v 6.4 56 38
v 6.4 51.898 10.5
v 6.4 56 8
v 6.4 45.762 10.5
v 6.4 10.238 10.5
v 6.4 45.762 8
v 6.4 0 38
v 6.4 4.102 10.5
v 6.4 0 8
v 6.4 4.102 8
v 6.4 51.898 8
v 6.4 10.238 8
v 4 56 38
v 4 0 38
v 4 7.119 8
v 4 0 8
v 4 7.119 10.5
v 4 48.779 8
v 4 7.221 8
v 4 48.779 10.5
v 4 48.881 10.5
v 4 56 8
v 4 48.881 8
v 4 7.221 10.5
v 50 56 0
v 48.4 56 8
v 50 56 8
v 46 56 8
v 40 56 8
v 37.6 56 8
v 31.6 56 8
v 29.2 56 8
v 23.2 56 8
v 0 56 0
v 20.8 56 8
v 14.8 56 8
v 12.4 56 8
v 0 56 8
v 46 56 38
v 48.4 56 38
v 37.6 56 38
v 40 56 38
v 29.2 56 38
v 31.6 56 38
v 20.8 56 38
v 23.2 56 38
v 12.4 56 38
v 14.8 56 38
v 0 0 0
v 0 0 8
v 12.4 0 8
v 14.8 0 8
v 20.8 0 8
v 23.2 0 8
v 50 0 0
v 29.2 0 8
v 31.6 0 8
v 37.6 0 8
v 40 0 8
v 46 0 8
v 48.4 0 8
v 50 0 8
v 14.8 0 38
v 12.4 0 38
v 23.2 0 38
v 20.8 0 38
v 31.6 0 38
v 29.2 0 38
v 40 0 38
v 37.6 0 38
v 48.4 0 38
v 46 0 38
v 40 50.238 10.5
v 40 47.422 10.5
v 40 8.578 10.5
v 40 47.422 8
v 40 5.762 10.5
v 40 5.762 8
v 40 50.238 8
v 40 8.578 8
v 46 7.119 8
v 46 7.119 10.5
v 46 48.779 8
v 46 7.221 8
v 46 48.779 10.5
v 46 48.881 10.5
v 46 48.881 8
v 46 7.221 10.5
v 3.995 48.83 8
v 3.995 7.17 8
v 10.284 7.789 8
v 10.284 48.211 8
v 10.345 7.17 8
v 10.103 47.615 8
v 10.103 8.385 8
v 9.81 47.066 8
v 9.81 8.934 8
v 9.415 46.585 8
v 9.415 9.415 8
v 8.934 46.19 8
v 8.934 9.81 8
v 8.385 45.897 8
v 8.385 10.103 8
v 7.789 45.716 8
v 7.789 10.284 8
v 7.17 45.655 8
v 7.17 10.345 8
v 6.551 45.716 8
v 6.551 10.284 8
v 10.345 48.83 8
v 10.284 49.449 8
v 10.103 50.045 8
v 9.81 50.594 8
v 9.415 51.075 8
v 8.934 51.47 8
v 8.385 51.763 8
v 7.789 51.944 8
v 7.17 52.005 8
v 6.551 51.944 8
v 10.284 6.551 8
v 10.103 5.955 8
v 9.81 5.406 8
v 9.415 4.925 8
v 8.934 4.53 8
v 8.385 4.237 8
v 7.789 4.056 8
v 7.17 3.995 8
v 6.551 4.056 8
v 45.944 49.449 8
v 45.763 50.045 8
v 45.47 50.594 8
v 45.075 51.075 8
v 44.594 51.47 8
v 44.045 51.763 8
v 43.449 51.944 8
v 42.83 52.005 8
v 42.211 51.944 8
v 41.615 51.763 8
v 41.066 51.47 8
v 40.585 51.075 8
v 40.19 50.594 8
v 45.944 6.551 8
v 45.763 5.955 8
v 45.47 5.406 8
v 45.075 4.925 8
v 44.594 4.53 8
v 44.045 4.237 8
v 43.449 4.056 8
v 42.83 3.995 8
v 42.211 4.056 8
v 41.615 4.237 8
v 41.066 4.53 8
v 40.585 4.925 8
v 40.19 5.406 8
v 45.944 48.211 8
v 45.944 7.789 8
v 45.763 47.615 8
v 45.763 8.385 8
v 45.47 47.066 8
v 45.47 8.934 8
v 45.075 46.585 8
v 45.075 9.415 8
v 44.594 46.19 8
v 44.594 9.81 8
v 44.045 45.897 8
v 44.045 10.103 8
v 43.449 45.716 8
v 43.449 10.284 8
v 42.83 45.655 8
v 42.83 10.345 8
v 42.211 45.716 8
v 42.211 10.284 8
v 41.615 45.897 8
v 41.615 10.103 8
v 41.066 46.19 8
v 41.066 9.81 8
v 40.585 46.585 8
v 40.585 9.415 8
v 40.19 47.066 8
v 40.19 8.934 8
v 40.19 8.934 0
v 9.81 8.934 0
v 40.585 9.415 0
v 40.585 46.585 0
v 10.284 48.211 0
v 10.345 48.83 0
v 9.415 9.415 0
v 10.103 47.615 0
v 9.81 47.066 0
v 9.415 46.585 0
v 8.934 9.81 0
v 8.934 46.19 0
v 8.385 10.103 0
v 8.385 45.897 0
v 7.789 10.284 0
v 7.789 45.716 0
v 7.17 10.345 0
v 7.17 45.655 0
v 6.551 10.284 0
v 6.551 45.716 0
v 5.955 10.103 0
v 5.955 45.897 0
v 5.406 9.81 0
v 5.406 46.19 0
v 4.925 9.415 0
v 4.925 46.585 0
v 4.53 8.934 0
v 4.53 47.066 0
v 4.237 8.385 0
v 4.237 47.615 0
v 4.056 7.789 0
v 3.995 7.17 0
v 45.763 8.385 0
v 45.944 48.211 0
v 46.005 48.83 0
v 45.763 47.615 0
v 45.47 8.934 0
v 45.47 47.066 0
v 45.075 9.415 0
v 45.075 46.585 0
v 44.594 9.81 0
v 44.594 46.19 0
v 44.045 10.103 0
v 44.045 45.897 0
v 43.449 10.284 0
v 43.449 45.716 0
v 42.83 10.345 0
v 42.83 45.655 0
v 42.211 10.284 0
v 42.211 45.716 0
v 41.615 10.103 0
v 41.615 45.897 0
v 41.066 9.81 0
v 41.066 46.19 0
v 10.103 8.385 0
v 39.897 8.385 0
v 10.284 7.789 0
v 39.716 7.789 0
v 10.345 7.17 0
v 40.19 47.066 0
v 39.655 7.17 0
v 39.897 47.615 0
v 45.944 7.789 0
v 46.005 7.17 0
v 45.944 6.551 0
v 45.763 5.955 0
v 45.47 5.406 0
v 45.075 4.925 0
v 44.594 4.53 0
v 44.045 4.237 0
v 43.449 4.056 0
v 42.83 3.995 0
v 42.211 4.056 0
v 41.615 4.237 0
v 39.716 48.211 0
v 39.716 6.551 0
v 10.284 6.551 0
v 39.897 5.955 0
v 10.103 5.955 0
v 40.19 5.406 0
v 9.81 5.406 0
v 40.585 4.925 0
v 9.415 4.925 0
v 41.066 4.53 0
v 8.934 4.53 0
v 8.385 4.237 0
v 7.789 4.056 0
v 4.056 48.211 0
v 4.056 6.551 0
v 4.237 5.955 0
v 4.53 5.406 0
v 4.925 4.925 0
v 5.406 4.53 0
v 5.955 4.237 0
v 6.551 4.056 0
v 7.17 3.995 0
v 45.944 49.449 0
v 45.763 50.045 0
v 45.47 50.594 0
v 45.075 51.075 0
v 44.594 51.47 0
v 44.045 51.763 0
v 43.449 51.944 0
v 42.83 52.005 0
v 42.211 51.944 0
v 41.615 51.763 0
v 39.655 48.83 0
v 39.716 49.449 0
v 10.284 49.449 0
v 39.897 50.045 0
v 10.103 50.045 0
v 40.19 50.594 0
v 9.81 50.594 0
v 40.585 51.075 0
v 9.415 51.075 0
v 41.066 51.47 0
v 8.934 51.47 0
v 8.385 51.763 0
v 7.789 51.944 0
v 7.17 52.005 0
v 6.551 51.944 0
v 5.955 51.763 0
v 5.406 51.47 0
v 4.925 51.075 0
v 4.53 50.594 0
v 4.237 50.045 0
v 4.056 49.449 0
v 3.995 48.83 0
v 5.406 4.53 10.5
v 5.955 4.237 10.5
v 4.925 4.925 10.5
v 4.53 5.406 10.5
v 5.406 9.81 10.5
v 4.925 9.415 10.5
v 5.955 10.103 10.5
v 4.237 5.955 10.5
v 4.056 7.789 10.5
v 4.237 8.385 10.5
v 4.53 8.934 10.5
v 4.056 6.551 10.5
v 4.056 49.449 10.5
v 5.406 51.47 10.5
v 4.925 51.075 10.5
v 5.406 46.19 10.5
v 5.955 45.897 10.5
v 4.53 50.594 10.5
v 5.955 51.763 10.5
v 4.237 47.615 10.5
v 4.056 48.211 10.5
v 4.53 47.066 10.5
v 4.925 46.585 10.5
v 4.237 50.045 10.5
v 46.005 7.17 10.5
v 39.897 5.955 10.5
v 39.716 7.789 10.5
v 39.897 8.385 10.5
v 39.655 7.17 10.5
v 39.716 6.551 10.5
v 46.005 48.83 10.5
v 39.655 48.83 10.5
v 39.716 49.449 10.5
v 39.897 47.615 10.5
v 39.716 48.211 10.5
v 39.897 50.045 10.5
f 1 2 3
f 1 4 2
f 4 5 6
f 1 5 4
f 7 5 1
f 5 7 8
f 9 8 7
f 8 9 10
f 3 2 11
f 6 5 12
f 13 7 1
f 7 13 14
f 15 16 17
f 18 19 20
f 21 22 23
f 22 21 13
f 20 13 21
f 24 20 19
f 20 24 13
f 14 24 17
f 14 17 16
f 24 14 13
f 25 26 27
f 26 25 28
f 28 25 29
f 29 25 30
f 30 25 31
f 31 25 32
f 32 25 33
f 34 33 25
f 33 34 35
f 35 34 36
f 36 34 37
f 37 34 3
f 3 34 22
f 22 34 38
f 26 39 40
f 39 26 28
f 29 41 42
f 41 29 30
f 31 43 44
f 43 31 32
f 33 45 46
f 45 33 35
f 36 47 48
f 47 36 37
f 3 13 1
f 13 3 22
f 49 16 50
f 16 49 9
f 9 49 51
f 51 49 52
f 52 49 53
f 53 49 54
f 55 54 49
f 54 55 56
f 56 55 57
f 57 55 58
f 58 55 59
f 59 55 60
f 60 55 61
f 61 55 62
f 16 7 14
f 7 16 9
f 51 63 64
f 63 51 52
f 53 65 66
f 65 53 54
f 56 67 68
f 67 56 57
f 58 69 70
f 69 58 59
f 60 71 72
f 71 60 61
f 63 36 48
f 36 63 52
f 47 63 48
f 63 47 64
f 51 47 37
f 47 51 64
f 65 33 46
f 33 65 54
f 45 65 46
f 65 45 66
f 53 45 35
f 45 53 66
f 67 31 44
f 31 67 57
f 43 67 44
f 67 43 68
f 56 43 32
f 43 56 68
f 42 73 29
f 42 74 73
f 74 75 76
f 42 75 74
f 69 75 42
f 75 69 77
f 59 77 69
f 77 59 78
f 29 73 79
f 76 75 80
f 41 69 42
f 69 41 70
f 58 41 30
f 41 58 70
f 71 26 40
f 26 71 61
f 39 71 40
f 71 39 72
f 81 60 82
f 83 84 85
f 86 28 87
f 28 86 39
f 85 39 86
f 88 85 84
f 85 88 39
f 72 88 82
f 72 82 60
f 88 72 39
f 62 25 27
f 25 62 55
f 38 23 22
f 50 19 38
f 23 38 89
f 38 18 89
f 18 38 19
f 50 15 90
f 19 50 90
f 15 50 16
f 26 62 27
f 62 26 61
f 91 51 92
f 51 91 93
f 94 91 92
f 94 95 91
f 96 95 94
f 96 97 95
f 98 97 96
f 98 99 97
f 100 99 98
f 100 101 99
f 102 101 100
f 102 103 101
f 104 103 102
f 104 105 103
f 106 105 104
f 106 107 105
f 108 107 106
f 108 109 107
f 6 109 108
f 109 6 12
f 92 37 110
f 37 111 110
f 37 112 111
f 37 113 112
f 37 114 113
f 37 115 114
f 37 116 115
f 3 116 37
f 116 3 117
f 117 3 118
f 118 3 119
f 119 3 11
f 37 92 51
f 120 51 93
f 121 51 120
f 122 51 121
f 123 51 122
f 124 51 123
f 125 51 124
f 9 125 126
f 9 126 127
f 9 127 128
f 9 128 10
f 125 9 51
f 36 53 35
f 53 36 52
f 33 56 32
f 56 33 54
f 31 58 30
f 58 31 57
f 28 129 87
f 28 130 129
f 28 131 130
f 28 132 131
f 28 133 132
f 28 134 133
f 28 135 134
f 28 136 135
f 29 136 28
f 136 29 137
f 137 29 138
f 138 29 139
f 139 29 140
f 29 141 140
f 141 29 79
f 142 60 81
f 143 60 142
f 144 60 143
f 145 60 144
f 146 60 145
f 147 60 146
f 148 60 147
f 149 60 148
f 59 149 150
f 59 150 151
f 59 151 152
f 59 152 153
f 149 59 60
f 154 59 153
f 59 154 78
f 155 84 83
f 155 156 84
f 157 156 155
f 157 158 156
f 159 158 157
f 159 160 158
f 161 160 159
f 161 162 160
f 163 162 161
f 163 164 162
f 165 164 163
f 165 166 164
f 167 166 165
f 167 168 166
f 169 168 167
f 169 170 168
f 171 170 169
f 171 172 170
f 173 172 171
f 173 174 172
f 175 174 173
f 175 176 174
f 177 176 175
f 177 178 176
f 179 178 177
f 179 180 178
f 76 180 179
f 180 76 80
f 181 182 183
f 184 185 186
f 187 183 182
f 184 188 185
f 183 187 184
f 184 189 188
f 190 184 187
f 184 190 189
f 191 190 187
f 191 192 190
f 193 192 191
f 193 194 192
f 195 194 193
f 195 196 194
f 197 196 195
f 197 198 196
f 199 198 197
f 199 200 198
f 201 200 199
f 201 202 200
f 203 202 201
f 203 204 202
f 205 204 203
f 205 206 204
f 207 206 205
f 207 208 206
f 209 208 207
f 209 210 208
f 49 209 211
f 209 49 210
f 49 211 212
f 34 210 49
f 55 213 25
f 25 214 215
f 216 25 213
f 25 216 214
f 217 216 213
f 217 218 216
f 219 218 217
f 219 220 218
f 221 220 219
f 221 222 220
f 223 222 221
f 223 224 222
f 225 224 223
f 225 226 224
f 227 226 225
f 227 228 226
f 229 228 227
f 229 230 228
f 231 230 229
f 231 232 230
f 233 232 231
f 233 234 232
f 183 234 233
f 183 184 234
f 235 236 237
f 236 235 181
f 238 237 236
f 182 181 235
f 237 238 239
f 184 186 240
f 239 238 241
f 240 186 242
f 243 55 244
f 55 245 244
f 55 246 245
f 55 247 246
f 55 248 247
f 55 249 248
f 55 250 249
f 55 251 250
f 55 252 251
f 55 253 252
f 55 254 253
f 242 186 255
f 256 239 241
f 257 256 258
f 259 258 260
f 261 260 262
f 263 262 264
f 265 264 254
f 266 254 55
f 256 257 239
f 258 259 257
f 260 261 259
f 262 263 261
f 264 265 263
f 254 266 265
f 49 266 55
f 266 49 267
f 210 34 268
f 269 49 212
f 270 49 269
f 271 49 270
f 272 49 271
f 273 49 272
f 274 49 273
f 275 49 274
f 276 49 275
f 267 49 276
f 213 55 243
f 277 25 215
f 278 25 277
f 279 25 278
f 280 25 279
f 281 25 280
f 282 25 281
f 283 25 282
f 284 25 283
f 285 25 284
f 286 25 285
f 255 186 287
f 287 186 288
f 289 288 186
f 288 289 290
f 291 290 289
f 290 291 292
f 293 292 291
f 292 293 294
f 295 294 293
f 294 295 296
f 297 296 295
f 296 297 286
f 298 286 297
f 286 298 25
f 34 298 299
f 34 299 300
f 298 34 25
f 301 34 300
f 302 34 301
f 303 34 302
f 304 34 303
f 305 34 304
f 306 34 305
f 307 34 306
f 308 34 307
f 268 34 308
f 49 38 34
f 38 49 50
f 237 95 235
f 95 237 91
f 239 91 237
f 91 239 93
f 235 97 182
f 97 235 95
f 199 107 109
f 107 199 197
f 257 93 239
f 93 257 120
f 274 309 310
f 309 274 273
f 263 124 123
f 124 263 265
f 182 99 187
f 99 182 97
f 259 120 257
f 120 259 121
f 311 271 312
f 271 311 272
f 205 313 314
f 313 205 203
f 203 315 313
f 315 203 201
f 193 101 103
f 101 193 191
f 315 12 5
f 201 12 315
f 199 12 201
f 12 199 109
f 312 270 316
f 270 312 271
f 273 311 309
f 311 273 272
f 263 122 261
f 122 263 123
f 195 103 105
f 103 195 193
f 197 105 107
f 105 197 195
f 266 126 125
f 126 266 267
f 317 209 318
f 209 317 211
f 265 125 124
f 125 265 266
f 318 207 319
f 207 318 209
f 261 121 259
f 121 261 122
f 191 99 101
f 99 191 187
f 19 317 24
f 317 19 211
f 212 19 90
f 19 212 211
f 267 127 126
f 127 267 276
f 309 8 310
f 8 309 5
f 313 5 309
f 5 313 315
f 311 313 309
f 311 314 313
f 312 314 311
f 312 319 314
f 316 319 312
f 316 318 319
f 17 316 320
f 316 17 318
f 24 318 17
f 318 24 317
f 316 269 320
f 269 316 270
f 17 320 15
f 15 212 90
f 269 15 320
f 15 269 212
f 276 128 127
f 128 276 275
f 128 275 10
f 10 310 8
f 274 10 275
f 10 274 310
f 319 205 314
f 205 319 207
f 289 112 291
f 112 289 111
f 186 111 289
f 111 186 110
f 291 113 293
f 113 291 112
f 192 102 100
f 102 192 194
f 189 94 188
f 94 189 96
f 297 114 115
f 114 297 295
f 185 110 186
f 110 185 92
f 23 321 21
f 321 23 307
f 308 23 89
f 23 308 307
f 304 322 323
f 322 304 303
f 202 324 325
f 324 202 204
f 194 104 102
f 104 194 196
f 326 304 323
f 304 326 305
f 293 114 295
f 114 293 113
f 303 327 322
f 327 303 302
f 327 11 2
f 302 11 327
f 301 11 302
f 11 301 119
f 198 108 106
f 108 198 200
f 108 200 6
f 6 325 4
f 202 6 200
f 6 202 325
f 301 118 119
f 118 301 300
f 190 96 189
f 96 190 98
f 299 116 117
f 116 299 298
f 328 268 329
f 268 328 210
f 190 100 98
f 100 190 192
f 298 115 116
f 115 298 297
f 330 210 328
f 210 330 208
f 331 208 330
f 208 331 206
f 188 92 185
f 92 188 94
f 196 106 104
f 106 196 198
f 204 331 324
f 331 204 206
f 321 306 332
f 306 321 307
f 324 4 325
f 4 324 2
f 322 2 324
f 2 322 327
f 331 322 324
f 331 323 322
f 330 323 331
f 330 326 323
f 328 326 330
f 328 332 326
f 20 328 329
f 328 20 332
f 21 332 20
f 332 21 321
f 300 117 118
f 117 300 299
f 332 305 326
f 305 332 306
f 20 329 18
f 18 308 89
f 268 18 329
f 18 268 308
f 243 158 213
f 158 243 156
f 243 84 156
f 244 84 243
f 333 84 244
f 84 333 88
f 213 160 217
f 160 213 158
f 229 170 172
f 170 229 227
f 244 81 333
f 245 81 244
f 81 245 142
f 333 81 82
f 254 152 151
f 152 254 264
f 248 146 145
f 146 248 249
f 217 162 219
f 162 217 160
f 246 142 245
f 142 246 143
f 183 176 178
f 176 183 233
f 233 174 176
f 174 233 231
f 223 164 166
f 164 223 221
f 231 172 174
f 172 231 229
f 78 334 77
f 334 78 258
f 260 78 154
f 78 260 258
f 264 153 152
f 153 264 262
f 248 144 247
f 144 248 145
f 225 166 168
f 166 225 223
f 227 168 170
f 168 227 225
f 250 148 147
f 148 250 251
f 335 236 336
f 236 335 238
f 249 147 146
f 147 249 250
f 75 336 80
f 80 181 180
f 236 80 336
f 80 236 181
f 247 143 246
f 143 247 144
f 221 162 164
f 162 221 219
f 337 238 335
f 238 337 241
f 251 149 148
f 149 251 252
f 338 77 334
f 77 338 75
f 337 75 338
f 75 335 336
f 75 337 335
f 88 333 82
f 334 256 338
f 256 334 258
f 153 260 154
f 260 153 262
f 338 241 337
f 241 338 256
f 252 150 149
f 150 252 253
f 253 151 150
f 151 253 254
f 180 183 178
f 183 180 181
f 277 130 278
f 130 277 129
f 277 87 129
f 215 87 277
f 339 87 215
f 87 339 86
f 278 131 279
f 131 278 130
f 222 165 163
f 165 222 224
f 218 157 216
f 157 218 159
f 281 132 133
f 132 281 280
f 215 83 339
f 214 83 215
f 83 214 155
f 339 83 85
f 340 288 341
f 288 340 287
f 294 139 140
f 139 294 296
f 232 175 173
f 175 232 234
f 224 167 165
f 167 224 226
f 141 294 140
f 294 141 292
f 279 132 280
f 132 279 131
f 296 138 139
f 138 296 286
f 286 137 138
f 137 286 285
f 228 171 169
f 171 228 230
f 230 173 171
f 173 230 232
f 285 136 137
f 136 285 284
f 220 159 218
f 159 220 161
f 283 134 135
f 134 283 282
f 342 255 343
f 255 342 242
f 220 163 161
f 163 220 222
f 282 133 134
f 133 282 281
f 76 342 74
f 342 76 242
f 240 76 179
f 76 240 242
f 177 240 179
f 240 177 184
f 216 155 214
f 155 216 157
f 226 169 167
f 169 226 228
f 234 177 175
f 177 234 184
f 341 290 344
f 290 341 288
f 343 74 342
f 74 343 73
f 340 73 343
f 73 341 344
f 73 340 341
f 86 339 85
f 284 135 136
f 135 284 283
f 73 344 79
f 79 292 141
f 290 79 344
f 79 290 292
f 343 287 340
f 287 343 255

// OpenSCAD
$fn = 32;

// ----------------------------------------------------------------------
// Finned heat sink: 50 x 56 mm base, 30 mm fins
// ----------------------------------------------------------------------

// --- parameters (mm) ---
base_w = 50;              // base width
base_d = 56;              // base depth
base_t = 8;               // base thickness
fin_h = 30;               // fin height above the base
holes_d = 6.35;           // fixing holes
hole_x = 17.83;           // hole offset in x
hole_y = 20.83;           // hole offset in y
fin_t = 2.4;              // fin thickness
fin_pitch = 8.4;          // fin pitch
fin_count = 6;            // number of fins
fin_x0 = 4;               // first fin offset

difference() {
  union() {
    cube([base_w, base_d, base_t]);
    for (i = [0 : fin_count - 1]) {
      translate([fin_x0 + i * fin_pitch, 0, base_t - 0.5]) cube([fin_t, base_d, fin_h + 0.5]);
    }
  }
  /* fixing holes through the base, 2.5 mm clear on both sides */
  for (hx = [-17.83, 17.83]) {
    for (hy = [-20.83, 20.83]) {
      translate([base_w / 2 + hx, base_d / 2 + hy, -2.5]) cylinder(h = base_t + 5, d = holes_d);
    }
  }
}
